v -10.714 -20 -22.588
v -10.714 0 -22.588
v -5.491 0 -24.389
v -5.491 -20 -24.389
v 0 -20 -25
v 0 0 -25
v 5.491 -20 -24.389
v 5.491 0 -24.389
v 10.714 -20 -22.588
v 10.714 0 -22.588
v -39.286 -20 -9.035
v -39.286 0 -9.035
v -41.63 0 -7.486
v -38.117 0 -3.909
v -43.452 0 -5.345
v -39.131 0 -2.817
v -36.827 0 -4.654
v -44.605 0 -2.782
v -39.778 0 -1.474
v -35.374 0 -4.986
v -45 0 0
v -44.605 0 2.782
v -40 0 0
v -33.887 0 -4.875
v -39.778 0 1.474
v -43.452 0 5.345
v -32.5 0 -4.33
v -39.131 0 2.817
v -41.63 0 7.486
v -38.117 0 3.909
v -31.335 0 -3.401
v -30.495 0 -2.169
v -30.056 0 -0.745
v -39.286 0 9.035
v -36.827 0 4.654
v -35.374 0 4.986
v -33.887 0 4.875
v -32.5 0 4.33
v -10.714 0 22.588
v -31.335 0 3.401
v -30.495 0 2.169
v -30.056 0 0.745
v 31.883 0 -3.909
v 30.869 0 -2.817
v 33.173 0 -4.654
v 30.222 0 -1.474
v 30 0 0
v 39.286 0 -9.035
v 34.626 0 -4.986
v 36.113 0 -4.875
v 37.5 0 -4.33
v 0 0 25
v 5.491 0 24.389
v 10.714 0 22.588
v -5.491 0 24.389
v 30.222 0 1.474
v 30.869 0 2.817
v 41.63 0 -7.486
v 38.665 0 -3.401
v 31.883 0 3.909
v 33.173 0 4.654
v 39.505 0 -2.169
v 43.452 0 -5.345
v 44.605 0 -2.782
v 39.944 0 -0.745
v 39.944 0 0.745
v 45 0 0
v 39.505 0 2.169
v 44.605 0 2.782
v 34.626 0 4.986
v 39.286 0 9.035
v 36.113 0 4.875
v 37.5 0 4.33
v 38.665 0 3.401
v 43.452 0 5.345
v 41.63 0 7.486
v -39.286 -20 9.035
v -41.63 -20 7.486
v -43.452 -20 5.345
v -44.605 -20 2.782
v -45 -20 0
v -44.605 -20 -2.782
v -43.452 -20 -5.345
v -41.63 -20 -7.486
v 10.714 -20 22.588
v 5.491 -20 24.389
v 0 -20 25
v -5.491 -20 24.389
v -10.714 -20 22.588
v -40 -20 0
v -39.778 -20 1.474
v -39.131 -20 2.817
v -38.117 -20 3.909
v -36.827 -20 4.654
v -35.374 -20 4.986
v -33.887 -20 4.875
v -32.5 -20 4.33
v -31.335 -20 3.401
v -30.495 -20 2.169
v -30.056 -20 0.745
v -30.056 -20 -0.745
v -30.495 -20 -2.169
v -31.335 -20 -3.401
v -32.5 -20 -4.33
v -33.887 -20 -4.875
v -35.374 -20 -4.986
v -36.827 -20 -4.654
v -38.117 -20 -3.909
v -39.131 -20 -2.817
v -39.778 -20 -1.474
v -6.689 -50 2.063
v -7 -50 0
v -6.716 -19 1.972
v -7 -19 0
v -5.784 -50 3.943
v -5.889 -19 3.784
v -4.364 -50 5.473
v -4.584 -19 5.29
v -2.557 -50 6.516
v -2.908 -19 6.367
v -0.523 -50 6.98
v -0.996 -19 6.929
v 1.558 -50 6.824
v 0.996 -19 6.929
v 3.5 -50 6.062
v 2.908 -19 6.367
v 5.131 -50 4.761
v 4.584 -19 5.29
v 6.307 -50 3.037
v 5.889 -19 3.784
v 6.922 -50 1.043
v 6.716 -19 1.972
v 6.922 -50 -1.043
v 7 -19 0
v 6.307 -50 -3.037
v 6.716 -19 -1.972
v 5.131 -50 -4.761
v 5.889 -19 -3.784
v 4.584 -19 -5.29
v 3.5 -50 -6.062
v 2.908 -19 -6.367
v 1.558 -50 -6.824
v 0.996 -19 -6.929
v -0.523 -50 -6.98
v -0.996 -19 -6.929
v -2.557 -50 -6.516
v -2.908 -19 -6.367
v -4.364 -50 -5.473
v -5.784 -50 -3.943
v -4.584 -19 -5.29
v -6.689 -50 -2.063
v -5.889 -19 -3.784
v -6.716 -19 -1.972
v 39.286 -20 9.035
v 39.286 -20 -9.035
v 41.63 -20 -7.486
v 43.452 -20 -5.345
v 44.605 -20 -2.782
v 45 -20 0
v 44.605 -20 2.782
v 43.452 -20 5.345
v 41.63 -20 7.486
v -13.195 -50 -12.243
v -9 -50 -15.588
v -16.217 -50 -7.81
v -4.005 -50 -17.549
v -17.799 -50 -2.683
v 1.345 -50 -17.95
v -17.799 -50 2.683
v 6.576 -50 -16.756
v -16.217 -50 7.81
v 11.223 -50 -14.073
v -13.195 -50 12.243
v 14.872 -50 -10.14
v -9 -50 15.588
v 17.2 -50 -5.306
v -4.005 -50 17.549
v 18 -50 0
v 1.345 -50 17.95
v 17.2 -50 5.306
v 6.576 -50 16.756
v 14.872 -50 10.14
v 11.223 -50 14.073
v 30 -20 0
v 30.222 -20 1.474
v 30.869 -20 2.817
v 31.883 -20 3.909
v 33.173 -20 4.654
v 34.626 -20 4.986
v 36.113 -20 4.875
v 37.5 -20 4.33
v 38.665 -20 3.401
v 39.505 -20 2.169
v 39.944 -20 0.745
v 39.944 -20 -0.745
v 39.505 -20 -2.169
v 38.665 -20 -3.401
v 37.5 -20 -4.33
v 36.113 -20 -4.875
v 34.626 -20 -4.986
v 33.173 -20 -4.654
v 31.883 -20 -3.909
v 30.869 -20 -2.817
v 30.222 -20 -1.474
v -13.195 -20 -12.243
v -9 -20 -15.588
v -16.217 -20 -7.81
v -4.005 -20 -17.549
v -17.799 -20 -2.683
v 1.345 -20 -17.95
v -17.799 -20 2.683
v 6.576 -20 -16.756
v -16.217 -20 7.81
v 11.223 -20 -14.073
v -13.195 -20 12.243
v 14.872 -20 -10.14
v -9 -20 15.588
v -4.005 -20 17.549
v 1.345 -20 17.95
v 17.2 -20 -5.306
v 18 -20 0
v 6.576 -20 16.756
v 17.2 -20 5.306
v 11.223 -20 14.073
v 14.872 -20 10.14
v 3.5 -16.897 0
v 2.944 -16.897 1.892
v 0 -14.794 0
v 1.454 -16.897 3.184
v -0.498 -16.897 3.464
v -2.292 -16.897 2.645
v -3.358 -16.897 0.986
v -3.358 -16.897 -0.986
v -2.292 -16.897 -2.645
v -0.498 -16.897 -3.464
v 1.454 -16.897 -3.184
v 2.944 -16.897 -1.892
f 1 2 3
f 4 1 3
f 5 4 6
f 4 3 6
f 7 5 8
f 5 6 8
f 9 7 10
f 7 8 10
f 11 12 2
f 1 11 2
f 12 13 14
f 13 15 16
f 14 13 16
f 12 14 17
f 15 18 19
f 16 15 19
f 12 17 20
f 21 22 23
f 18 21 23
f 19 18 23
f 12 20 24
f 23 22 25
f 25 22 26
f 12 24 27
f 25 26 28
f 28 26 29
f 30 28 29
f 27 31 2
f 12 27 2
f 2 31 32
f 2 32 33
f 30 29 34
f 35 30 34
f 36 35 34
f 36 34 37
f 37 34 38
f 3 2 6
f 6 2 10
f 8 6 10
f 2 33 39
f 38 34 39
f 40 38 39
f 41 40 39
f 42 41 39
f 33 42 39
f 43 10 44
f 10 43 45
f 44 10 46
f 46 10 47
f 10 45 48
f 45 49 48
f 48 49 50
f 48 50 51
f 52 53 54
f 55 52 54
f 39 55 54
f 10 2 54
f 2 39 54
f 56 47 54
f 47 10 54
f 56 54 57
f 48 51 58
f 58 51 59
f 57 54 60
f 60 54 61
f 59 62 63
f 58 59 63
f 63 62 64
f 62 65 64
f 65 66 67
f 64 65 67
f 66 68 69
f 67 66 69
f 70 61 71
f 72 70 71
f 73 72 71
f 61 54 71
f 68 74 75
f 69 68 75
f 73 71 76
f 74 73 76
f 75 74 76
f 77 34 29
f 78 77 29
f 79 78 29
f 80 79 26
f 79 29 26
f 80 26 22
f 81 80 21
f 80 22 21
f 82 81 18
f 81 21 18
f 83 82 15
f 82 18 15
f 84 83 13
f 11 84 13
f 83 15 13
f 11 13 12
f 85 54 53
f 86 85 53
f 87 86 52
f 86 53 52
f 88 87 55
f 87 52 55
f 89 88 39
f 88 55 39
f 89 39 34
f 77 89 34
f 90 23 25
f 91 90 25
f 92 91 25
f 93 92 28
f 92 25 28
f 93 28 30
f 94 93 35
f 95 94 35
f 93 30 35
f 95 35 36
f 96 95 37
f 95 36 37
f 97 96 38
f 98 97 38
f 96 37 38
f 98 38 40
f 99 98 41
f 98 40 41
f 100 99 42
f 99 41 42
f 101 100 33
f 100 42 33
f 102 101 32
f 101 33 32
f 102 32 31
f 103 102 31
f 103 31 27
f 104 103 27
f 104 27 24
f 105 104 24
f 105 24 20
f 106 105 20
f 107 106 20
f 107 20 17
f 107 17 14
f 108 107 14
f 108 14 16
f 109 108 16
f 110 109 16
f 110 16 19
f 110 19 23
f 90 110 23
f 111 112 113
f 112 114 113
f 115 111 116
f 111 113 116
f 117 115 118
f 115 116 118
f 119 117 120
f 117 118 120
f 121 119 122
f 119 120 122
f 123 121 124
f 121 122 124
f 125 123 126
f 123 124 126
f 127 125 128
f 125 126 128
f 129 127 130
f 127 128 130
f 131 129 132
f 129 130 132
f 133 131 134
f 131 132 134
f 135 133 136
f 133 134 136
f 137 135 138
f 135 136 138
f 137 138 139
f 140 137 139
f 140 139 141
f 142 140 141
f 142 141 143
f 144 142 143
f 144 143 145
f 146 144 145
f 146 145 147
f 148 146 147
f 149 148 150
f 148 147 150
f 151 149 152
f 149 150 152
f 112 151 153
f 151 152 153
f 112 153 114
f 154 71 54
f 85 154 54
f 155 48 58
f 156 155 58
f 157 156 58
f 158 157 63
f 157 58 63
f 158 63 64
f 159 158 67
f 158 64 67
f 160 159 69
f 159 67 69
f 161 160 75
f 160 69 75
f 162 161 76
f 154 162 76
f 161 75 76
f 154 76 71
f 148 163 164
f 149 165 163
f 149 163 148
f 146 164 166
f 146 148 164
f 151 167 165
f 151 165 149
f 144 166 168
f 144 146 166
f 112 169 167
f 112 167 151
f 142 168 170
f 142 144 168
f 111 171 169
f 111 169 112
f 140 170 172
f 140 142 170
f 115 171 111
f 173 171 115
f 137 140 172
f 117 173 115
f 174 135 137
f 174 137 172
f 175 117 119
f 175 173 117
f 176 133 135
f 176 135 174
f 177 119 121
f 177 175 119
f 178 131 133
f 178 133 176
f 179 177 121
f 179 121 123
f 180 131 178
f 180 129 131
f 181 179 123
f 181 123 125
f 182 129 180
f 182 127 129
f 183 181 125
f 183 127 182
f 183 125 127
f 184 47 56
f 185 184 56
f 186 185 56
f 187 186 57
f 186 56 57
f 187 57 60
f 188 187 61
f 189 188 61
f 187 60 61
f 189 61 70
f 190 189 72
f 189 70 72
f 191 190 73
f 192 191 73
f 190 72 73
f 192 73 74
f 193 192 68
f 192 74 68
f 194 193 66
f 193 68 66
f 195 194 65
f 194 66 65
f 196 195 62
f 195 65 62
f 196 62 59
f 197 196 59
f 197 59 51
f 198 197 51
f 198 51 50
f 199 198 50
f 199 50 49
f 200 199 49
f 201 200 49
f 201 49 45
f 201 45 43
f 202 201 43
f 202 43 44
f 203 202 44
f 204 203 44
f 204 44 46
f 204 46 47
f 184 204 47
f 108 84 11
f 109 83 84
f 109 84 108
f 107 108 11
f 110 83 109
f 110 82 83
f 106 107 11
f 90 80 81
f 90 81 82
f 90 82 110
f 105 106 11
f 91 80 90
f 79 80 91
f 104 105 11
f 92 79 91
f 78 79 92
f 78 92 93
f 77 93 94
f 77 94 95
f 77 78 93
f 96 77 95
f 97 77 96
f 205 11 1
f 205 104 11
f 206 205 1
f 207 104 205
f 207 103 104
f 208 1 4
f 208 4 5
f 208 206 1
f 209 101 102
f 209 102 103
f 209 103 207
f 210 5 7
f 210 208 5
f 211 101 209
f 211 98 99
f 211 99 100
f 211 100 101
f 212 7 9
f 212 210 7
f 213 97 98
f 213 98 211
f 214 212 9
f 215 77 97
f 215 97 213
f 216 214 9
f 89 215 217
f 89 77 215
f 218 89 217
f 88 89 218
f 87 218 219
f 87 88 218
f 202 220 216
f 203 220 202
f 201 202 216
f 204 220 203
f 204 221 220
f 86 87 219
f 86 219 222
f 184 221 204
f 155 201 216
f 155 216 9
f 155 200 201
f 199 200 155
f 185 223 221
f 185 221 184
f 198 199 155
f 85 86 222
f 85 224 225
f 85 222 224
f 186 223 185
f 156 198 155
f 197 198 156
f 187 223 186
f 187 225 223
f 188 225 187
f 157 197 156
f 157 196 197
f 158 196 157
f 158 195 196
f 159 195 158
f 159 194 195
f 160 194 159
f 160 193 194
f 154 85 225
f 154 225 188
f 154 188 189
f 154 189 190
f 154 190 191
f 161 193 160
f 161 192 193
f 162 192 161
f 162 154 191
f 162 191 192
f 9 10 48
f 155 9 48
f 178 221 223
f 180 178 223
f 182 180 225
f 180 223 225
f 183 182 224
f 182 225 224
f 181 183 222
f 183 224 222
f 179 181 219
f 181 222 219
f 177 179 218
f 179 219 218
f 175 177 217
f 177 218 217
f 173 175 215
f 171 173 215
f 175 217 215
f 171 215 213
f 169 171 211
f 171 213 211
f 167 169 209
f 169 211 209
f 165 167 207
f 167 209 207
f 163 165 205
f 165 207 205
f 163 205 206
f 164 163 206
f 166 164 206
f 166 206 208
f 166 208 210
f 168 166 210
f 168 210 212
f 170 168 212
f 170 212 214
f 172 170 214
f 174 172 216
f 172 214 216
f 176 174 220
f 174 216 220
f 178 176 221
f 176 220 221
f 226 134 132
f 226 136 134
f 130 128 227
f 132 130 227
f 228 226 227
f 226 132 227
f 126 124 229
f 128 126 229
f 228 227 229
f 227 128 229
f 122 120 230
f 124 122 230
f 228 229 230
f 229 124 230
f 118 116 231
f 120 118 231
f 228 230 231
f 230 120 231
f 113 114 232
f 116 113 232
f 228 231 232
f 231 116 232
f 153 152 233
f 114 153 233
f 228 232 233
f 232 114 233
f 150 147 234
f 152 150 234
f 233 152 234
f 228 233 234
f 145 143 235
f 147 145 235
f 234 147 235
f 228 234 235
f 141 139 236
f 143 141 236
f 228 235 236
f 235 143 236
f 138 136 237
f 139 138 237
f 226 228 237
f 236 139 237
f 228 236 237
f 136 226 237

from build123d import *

# Parameters (mm, degrees)
F1_DEPTH = 20
F2_R     = 18
F3_DEPTH = 30
F6_D     = 10
F7_D     = 14
F7_DEPTH = 31
F7_TIP   = 4.2060243332


with BuildPart() as f1:
    # F0 (on Front) → F1 (new body)
    with BuildSketch(Plane.XZ):
        with BuildLine():
            Line((39.2857142857, 9.0350790291), (10.7142857143, 22.5876975726))
            ThreePointArc((10.7142857143, 22.5876975726), (0, 25), (-10.7142857143, 22.5876975726))
            Line((-10.7142857143, 22.5876975726), (-39.2857142857, 9.0350790291))
            ThreePointArc((-39.2857142857, 9.0350790291), (-45, 0), (-39.2857142857, -9.0350790291))
            Line((-39.2857142857, -9.0350790291), (-10.7142857143, -22.5876975726))
            ThreePointArc((-10.7142857143, -22.5876975726), (0, -25), (10.7142857143, -22.5876975726))
            Line((10.7142857143, -22.5876975726), (39.2857142857, -9.0350790291))
            ThreePointArc((39.2857142857, -9.0350790291), (45, 0), (39.2857142857, 9.0350790291))
        make_face()
    extrude(amount=F1_DEPTH)

    # F2 (on face) → F3 (join)
    with BuildSketch(Plane.XZ.offset(20)):
        Circle(F2_R)
    extrude(amount=F3_DEPTH)

    # F6 (through all)
    with Locations(Plane.XZ.offset(20)):
        with Locations((35, 0), (-35, 0)):
            Hole(F6_D / 2)

    # F7
    with Locations(Plane.XZ.offset(50)):
        with Locations((0, 0)):
            Hole(F7_D / 2, depth=F7_DEPTH)
            with Locations((0, 0, -(F7_DEPTH + F7_TIP / 2))):  # 118° drill point
                Cone(0, F7_D / 2, F7_TIP, mode=Mode.SUBTRACT)


solid = f1.part
